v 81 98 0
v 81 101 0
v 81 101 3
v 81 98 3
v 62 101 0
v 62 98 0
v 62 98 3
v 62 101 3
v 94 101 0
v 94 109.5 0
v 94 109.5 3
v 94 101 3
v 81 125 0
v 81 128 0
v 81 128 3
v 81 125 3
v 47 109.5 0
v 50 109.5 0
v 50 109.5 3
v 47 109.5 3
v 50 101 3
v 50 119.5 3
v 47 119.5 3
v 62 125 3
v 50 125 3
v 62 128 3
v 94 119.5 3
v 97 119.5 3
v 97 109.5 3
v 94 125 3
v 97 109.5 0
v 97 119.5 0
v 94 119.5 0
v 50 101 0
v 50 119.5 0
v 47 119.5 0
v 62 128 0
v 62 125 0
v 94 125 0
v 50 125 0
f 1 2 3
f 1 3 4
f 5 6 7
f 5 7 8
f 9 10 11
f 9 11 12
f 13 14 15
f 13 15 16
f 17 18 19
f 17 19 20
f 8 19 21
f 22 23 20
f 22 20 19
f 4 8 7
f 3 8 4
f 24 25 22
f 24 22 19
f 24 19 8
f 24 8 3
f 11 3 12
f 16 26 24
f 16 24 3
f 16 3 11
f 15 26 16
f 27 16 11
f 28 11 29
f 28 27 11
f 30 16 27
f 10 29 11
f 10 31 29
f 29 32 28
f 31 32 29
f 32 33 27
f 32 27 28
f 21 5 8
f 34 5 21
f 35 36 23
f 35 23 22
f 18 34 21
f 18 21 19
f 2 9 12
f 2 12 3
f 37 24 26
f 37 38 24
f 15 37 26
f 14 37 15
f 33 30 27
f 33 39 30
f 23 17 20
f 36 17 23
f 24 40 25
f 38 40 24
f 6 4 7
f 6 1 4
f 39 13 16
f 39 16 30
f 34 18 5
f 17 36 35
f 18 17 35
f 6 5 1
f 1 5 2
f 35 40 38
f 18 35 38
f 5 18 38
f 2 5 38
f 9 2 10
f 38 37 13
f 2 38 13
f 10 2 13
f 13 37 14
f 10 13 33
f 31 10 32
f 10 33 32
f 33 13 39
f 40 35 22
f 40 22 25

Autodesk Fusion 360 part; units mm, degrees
sketch "Sketch1" plane through (0, 0, 0) normal (0, 0, 1) x (1, 0, 0)
  line L0 (50, 125) -> (62, 125)
  line L1 (62, 125) -> (62, 128)
  line L2 (62, 128) -> (81, 128)
  line L3 (81, 128) -> (81, 125)
  line L4 (81, 125) -> (94, 125)
  line L5 (94, 125) -> (94, 119.5)
  line L6 (94, 119.5) -> (97, 119.5)
  line L7 (97, 119.5) -> (97, 109.5)
  line L8 (97, 109.5) -> (94, 109.5)
  line L9 (94, 109.5) -> (94, 101)
  line L10 (94, 101) -> (81, 101)
  line L11 (81, 101) -> (81, 98)
  line L12 (81, 98) -> (62, 98)
  line L13 (62, 98) -> (62, 101)
  line L14 (62, 101) -> (50, 101)
  line L15 (50, 101) -> (50, 109.5)
  line L16 (50, 109.5) -> (47, 109.5)
  line L17 (47, 109.5) -> (47, 119.5)
  line L18 (47, 119.5) -> (50, 119.5)
  line L19 (50, 119.5) -> (50, 125)
  dimension "d1" = 12
  dimension "d2" = 3
  dimension "d3" = 19
  dimension "d4" = 3
  dimension "d5" = 13
  dimension "d6" = 5.5
  dimension "d7" = 3
  dimension "d8" = 10
  dimension "d9" = 3
  dimension "d10" = 8.5
  dimension "d11" = 13
  dimension "d12" = 3
  dimension "d13" = 19
  dimension "d14" = 3
  dimension "d15" = 12
  dimension "d16" = 8.5
  dimension "d17" = 3
  dimension "d18" = 10
  dimension "d19" = 3
extrude "Extrude1" add sketch "Sketch1" along normal blind 3
